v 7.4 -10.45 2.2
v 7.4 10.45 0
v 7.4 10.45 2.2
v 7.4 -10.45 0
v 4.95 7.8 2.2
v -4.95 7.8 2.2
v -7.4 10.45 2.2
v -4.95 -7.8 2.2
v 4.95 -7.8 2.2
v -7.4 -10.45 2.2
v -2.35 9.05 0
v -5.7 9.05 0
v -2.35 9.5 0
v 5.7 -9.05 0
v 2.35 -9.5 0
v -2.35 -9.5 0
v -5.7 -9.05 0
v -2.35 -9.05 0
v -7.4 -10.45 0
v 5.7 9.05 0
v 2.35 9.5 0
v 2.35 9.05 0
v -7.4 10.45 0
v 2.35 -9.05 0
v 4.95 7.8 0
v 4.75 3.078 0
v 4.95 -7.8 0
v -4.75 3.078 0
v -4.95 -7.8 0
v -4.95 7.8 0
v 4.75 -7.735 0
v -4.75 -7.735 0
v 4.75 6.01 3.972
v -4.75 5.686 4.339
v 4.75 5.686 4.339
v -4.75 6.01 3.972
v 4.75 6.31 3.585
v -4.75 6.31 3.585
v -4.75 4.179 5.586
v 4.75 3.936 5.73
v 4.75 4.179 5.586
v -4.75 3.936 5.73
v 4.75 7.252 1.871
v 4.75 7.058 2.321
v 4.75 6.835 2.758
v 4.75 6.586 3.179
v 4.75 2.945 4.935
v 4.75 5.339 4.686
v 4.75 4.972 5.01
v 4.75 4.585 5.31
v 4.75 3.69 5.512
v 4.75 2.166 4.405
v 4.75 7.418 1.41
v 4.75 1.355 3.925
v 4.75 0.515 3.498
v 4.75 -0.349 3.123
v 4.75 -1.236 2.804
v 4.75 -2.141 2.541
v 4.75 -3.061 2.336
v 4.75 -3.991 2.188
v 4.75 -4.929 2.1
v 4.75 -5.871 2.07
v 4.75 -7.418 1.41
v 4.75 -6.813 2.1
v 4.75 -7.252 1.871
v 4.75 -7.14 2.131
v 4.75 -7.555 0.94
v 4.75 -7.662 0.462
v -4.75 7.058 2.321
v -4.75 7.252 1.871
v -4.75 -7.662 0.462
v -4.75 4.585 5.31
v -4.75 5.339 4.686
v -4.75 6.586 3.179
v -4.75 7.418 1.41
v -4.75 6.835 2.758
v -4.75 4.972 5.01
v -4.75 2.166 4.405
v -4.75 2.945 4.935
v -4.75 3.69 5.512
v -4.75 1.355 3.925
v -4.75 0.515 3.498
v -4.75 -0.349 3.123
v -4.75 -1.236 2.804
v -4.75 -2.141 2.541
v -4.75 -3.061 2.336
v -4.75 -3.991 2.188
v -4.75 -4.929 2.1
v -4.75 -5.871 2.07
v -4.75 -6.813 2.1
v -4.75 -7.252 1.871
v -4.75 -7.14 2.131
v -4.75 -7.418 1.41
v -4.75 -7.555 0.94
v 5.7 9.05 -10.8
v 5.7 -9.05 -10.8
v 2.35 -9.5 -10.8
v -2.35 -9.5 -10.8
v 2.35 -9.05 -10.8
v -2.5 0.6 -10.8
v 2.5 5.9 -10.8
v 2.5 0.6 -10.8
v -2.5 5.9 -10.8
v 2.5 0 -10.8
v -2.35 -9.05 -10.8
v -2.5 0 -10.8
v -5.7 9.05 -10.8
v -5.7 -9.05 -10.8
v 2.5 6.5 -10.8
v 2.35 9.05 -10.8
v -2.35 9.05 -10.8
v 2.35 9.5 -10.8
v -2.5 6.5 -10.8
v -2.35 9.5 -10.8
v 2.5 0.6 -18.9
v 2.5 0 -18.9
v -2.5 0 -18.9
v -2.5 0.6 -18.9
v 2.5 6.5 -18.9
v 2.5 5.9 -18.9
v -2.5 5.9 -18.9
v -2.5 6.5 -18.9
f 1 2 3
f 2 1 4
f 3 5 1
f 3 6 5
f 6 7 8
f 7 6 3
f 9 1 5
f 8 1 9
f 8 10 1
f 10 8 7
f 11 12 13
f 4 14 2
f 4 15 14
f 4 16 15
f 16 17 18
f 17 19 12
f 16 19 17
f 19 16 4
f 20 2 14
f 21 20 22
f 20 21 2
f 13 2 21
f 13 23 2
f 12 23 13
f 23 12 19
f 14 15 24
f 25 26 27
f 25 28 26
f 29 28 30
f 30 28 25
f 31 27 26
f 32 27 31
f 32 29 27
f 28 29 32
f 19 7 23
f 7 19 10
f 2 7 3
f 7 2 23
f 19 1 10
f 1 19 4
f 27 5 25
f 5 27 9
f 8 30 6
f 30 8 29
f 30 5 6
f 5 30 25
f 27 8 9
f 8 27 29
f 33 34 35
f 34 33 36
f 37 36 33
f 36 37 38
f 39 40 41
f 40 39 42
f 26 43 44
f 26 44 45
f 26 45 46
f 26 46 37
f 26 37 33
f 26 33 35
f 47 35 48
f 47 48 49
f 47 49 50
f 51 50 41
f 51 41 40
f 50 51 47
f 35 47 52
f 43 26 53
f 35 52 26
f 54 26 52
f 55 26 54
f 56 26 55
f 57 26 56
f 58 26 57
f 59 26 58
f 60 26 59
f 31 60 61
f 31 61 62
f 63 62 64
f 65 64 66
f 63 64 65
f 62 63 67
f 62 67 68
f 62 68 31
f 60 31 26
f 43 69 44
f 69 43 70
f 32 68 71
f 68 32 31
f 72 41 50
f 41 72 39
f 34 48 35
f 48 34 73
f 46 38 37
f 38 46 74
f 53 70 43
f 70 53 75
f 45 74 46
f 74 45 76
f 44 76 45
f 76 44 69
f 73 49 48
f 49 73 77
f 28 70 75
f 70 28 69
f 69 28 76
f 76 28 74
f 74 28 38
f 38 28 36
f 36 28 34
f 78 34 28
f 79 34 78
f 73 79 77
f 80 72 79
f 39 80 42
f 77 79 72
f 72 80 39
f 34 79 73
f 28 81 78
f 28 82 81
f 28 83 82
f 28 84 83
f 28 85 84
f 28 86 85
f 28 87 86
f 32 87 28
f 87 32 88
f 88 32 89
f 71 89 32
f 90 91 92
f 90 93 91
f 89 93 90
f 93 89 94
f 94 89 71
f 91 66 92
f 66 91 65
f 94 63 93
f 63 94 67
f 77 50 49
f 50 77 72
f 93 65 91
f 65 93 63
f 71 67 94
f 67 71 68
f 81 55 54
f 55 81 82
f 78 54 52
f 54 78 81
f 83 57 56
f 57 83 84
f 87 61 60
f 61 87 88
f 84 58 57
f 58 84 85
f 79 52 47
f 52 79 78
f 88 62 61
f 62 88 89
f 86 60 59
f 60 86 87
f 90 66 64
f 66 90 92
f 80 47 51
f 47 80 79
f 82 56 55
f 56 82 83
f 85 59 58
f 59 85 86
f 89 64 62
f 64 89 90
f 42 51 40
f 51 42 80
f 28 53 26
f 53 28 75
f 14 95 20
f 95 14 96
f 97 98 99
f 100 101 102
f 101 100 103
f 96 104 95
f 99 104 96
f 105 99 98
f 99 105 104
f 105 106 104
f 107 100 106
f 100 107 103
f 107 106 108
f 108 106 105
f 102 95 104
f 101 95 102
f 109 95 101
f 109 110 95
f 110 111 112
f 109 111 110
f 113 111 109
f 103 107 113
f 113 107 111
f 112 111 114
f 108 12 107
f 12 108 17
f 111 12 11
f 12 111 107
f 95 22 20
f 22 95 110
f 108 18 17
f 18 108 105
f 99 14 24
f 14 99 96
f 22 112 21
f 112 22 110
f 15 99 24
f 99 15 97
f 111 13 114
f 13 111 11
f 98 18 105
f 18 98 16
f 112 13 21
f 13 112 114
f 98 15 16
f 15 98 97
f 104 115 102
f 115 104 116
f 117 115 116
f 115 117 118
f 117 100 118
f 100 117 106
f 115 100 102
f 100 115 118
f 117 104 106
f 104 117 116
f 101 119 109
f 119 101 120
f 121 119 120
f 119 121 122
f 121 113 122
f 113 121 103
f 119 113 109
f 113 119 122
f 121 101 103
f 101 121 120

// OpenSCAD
$fn = 100;

Jacket = [14.8, 20.9];
Jacket_Height_Inner = 2.2;
Jacket_Height_Outer = 1.2;
Hole = [9.9, 15.6, 5.0];
Switch_Width = 9.5;
Switch_Diameter = 15.6;
Curvature_Height = 4.0;
Curvature_Radius = 15.0;
Joint_Pos = 1.0;
Body = [11.4, 18.1, 10.8];
Clip_Width = 4.7;
Clip_Extent = 19;
Pin = [5.0, 0.6, 8.1];
Pins_Distance = 5.9;

e = 0.01;

PowerSwitch("#222", "#888");

module PowerSwitch(switch_color, metal_color) {
  color(switch_color) {
    difference() {
      union() {
        translate([-Jacket[0] / 2, -Jacket[1] / 2, 0])
          cube([Jacket[0], Jacket[1], Jacket_Height_Inner]);
      }
      translate([-Hole[0] / 2, -Hole[1] / 2, Jacket_Height_Inner - Hole[2]])
        cube([Hole[0], Hole[1], Hole[2] + e]);
    }
    translate([0, 0, -Joint_Pos])
      rotate([18, 0, 0])
        difference() {
          rotate([0, 90, 0])
            cylinder(Switch_Width, d = Switch_Diameter, center = true);
          translate([0, 0, Curvature_Radius + Curvature_Height])
            rotate([0, 90, 0])
              cylinder(Switch_Width + e, r=Curvature_Radius, center = true);
          translate([-(Switch_Width + e) / 2, -(Switch_Diameter + e) / 2, -Curvature_Radius])
            cube([Switch_Width + e, Switch_Diameter + e, Curvature_Radius]);
        }
    translate([-Body[0] / 2, -Body[1] / 2, -Body[2]])
      cube(Body);
    translate([-Clip_Width / 2, -Clip_Extent / 2 , -Body[2]])
      cube([Clip_Width, Clip_Extent, Body[2]]);
  }
  color(metal_color) {
    for (i = [0, 1])
      translate([-Pin[0] / 2, i * Pins_Distance, -Body[2] - Pin[2]])
        cube(Pin);
  }
}
